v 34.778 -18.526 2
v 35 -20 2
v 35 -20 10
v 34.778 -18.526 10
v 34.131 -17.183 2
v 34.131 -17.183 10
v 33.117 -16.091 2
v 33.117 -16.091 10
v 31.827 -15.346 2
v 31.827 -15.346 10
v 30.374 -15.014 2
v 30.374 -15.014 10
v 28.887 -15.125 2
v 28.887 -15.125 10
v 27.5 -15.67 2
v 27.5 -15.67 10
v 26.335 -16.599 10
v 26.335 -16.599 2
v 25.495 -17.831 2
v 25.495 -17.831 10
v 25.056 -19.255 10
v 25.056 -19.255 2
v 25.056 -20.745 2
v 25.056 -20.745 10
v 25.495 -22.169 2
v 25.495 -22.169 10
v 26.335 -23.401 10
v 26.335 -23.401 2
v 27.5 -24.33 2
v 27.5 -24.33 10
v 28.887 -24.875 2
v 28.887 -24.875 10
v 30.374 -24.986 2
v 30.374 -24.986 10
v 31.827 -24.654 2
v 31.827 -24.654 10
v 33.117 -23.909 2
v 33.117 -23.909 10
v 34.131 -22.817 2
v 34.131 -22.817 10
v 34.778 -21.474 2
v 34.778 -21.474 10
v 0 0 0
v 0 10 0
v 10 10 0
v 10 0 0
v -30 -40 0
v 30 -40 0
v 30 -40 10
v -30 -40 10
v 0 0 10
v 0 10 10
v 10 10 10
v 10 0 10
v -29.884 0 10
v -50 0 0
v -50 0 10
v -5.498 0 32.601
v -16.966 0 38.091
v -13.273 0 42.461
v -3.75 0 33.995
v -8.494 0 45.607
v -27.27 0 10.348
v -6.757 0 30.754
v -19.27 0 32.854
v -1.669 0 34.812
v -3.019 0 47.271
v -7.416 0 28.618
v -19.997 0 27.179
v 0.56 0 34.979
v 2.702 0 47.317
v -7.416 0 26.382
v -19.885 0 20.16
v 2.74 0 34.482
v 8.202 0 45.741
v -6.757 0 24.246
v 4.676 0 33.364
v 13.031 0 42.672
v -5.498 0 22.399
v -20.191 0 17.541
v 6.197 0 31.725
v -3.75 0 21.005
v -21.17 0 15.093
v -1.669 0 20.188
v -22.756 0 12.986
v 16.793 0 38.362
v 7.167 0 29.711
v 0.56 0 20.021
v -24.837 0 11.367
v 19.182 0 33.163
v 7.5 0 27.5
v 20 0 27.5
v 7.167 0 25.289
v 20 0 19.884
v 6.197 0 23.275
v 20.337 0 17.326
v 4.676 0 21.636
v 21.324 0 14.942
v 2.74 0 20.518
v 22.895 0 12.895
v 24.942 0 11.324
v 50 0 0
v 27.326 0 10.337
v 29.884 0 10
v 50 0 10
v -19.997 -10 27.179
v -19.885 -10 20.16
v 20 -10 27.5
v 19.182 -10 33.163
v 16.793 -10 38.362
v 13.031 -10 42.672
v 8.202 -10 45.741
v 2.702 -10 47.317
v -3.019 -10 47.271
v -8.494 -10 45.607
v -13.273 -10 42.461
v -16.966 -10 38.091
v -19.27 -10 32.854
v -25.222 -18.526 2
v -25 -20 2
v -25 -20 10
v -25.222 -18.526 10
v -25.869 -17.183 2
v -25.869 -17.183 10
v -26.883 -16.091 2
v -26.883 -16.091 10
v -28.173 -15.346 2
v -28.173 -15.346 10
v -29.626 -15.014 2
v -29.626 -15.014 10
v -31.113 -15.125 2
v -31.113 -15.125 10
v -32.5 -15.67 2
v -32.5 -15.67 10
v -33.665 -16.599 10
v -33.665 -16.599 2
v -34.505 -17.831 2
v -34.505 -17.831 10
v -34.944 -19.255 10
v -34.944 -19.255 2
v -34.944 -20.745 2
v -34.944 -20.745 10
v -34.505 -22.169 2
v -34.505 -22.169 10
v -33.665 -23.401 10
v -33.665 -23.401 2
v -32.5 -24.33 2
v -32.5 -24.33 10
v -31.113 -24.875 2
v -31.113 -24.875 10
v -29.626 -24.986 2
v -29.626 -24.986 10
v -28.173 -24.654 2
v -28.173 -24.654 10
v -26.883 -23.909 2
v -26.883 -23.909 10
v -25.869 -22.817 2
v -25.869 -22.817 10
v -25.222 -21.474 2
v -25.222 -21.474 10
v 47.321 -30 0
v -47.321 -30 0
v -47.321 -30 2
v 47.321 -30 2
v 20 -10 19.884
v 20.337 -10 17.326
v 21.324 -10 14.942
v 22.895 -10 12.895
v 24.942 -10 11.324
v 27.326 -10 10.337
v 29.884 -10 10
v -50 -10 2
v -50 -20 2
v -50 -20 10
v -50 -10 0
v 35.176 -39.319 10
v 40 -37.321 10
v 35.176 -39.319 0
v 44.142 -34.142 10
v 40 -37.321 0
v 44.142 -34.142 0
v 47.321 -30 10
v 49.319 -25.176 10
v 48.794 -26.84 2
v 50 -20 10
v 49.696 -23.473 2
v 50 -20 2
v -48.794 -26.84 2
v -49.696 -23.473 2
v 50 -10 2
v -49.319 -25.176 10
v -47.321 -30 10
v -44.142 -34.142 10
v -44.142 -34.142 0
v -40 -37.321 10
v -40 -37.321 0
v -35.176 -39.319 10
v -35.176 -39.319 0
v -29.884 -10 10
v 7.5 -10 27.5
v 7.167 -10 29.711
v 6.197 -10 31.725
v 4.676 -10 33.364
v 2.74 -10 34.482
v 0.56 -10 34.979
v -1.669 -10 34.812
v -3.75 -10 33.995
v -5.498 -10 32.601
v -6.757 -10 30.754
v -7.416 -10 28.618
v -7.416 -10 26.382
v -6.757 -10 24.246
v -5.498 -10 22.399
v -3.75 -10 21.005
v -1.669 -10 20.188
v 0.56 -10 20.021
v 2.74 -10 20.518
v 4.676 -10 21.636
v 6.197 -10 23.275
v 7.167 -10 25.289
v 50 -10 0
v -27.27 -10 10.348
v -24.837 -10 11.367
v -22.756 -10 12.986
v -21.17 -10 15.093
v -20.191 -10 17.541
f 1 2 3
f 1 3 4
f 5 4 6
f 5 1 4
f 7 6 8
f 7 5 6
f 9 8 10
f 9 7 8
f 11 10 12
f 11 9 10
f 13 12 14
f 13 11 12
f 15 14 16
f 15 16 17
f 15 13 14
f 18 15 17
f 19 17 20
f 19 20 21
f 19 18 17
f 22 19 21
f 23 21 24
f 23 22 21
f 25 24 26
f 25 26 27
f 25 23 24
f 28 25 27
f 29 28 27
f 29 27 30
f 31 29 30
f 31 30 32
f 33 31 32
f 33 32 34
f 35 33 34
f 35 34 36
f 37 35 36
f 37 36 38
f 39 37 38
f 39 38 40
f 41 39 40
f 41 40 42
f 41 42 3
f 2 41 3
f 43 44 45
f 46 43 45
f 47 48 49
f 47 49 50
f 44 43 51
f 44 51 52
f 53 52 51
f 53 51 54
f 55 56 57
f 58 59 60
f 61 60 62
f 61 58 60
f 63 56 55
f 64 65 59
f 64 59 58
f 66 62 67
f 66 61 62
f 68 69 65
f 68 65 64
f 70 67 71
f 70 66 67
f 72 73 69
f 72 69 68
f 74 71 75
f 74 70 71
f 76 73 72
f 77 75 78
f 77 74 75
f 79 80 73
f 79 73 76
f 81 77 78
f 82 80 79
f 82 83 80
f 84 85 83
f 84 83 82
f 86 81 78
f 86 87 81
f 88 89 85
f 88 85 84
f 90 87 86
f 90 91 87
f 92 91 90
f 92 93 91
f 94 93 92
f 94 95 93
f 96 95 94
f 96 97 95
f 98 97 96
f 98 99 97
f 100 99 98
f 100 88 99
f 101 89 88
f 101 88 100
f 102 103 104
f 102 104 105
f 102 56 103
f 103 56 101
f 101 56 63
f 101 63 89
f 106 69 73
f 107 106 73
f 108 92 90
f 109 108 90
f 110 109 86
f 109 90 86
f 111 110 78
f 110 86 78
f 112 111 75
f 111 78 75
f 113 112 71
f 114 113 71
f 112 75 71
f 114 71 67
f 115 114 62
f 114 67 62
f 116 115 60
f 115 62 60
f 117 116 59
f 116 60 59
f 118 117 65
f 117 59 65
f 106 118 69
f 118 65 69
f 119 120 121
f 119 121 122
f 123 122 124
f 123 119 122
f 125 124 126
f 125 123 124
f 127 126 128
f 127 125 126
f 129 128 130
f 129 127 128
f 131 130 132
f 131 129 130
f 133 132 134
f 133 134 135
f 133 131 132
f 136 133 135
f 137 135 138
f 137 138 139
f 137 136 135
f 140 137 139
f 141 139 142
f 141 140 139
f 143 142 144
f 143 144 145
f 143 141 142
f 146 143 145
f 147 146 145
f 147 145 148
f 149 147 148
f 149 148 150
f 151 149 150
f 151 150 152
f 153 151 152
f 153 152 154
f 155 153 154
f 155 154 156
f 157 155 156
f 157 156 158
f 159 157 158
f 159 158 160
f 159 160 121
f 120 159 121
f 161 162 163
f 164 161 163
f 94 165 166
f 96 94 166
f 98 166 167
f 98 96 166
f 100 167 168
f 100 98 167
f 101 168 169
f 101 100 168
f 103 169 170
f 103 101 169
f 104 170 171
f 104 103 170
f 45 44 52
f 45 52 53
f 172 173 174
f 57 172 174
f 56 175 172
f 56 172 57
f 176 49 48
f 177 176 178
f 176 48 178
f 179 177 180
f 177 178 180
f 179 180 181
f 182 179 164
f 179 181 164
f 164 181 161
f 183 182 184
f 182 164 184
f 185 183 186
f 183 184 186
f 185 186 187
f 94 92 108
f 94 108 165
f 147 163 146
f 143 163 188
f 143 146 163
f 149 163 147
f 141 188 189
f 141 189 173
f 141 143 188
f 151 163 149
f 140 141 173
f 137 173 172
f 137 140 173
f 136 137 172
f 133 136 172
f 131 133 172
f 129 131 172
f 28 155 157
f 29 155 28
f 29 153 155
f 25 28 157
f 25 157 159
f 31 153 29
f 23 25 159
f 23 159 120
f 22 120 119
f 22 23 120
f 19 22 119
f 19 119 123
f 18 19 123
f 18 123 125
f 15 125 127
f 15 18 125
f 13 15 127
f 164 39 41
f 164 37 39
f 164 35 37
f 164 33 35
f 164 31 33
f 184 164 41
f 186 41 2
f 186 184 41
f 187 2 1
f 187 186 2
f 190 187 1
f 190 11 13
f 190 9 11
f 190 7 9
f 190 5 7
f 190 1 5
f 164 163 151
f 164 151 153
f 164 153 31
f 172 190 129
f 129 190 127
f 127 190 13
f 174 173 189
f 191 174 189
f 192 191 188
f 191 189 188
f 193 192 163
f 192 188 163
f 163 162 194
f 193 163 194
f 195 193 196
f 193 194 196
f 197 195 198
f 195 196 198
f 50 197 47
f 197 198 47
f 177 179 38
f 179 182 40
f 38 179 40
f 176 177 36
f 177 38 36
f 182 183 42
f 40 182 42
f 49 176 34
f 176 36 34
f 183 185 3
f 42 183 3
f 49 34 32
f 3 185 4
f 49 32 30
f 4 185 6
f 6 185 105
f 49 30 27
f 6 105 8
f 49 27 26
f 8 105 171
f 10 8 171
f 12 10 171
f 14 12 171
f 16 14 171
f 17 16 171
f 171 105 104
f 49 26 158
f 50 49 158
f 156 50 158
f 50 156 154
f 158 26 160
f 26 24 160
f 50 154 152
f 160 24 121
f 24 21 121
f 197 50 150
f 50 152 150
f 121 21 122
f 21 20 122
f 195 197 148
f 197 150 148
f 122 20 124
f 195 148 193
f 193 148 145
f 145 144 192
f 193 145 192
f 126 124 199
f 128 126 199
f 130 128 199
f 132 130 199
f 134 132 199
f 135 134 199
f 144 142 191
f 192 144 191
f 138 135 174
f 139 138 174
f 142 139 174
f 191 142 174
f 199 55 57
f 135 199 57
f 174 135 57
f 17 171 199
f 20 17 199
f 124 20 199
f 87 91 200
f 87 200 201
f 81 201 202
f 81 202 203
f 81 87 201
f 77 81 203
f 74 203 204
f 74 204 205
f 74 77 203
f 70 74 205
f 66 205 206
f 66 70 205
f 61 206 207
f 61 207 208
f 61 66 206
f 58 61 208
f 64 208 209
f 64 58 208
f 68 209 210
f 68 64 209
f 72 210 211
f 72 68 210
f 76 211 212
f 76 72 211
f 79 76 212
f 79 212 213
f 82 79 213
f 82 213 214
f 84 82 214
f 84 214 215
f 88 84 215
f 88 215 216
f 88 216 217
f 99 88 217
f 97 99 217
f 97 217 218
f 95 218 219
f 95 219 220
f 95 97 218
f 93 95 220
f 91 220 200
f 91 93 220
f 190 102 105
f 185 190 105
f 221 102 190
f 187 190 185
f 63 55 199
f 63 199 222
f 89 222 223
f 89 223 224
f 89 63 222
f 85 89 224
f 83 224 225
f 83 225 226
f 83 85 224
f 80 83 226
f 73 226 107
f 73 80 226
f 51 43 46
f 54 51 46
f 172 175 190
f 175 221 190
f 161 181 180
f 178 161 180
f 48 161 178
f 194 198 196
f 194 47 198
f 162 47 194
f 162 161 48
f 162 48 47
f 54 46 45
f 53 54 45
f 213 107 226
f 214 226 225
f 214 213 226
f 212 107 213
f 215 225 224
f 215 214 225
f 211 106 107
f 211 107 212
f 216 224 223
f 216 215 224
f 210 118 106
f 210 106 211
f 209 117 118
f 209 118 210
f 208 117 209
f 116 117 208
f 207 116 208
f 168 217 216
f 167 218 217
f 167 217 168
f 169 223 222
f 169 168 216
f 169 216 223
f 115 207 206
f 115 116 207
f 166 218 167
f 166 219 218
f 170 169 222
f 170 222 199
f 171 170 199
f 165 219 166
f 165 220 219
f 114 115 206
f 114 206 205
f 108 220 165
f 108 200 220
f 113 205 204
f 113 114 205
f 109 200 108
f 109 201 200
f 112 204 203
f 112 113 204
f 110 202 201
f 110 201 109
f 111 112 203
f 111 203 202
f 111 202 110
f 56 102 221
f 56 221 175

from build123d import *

# Parameters (mm, degrees)
SKETCH002_W  = 20
SKETCH002_H  = 10
PAD002_DEPTH = 60
SKETCH_R     = 5
PAD_DEPTH    = 10
SKETCH001_R  = 7.5
PAD001_DEPTH = 10
BOX_W        = 10
BOX_H        = 10
BOX_DEPTH    = 10


with BuildPart() as pad002:
    # Sketch002 → Pad002 (new body, symmetric)
    with BuildSketch(Plane.YZ):
        with Locations((-20, -3)):
            Rectangle(SKETCH002_W, SKETCH002_H)
    extrude(amount=PAD002_DEPTH, both=True)


with BuildPart() as pad:
    # Sketch → Pad (new body)
    with BuildSketch(Plane.XY):
        with BuildLine():
            Line((-50, 0), (50, 0))
            Line((50, 0), (50, -20))
            ThreePointArc((30, -40), (44.142136, -34.142136), (50, -20))
            Line((30, -40), (-30, -40))
            ThreePointArc((-50, -20), (-44.142136, -34.142136), (-30, -40))
            Line((-50, -20), (-50, 0))
        make_face()
        with Locations((-30, -20)):
            Circle(SKETCH_R, mode=Mode.SUBTRACT)
        with Locations((30, -20)):
            Circle(SKETCH_R, mode=Mode.SUBTRACT)
    extrude(amount=PAD_DEPTH)


with BuildPart() as cut:
    # Sketch001 → Pad001 (new body)
    with BuildSketch(Plane.XZ):
        with BuildLine():
            ThreePointArc((20, 27.5), (-0.160385, 47.499357), (-19.997428, 27.179241))
            Line((-19.997428, 27.179241), (-19.884845, 20.160379))
            ThreePointArc((-29.883559, 10), (-22.756014, 12.985864), (-19.884845, 20.160379))
            Line((-29.883559, 10), (29.883559, 10))
            ThreePointArc((20, 19.883559), (22.894827, 12.894828), (29.883559, 10))
            Line((20, 27.5), (20, 19.883559))
        make_face()
        with Locations((0, 27.5)):
            Circle(SKETCH001_R, mode=Mode.SUBTRACT)
    extrude(amount=PAD001_DEPTH)

    # Fusion: union Pad
    add(pad.part)

    # Cut: cut Pad002
    add(pad002.part, mode=Mode.SUBTRACT)


with BuildPart() as cubo:
    # Box → Box (new body)
    with BuildSketch(Plane.XY):
        with Locations((5, 5)):
            Rectangle(BOX_W, BOX_H)
    extrude(amount=BOX_DEPTH)


solid = Compound([cut.part, cubo.part])
